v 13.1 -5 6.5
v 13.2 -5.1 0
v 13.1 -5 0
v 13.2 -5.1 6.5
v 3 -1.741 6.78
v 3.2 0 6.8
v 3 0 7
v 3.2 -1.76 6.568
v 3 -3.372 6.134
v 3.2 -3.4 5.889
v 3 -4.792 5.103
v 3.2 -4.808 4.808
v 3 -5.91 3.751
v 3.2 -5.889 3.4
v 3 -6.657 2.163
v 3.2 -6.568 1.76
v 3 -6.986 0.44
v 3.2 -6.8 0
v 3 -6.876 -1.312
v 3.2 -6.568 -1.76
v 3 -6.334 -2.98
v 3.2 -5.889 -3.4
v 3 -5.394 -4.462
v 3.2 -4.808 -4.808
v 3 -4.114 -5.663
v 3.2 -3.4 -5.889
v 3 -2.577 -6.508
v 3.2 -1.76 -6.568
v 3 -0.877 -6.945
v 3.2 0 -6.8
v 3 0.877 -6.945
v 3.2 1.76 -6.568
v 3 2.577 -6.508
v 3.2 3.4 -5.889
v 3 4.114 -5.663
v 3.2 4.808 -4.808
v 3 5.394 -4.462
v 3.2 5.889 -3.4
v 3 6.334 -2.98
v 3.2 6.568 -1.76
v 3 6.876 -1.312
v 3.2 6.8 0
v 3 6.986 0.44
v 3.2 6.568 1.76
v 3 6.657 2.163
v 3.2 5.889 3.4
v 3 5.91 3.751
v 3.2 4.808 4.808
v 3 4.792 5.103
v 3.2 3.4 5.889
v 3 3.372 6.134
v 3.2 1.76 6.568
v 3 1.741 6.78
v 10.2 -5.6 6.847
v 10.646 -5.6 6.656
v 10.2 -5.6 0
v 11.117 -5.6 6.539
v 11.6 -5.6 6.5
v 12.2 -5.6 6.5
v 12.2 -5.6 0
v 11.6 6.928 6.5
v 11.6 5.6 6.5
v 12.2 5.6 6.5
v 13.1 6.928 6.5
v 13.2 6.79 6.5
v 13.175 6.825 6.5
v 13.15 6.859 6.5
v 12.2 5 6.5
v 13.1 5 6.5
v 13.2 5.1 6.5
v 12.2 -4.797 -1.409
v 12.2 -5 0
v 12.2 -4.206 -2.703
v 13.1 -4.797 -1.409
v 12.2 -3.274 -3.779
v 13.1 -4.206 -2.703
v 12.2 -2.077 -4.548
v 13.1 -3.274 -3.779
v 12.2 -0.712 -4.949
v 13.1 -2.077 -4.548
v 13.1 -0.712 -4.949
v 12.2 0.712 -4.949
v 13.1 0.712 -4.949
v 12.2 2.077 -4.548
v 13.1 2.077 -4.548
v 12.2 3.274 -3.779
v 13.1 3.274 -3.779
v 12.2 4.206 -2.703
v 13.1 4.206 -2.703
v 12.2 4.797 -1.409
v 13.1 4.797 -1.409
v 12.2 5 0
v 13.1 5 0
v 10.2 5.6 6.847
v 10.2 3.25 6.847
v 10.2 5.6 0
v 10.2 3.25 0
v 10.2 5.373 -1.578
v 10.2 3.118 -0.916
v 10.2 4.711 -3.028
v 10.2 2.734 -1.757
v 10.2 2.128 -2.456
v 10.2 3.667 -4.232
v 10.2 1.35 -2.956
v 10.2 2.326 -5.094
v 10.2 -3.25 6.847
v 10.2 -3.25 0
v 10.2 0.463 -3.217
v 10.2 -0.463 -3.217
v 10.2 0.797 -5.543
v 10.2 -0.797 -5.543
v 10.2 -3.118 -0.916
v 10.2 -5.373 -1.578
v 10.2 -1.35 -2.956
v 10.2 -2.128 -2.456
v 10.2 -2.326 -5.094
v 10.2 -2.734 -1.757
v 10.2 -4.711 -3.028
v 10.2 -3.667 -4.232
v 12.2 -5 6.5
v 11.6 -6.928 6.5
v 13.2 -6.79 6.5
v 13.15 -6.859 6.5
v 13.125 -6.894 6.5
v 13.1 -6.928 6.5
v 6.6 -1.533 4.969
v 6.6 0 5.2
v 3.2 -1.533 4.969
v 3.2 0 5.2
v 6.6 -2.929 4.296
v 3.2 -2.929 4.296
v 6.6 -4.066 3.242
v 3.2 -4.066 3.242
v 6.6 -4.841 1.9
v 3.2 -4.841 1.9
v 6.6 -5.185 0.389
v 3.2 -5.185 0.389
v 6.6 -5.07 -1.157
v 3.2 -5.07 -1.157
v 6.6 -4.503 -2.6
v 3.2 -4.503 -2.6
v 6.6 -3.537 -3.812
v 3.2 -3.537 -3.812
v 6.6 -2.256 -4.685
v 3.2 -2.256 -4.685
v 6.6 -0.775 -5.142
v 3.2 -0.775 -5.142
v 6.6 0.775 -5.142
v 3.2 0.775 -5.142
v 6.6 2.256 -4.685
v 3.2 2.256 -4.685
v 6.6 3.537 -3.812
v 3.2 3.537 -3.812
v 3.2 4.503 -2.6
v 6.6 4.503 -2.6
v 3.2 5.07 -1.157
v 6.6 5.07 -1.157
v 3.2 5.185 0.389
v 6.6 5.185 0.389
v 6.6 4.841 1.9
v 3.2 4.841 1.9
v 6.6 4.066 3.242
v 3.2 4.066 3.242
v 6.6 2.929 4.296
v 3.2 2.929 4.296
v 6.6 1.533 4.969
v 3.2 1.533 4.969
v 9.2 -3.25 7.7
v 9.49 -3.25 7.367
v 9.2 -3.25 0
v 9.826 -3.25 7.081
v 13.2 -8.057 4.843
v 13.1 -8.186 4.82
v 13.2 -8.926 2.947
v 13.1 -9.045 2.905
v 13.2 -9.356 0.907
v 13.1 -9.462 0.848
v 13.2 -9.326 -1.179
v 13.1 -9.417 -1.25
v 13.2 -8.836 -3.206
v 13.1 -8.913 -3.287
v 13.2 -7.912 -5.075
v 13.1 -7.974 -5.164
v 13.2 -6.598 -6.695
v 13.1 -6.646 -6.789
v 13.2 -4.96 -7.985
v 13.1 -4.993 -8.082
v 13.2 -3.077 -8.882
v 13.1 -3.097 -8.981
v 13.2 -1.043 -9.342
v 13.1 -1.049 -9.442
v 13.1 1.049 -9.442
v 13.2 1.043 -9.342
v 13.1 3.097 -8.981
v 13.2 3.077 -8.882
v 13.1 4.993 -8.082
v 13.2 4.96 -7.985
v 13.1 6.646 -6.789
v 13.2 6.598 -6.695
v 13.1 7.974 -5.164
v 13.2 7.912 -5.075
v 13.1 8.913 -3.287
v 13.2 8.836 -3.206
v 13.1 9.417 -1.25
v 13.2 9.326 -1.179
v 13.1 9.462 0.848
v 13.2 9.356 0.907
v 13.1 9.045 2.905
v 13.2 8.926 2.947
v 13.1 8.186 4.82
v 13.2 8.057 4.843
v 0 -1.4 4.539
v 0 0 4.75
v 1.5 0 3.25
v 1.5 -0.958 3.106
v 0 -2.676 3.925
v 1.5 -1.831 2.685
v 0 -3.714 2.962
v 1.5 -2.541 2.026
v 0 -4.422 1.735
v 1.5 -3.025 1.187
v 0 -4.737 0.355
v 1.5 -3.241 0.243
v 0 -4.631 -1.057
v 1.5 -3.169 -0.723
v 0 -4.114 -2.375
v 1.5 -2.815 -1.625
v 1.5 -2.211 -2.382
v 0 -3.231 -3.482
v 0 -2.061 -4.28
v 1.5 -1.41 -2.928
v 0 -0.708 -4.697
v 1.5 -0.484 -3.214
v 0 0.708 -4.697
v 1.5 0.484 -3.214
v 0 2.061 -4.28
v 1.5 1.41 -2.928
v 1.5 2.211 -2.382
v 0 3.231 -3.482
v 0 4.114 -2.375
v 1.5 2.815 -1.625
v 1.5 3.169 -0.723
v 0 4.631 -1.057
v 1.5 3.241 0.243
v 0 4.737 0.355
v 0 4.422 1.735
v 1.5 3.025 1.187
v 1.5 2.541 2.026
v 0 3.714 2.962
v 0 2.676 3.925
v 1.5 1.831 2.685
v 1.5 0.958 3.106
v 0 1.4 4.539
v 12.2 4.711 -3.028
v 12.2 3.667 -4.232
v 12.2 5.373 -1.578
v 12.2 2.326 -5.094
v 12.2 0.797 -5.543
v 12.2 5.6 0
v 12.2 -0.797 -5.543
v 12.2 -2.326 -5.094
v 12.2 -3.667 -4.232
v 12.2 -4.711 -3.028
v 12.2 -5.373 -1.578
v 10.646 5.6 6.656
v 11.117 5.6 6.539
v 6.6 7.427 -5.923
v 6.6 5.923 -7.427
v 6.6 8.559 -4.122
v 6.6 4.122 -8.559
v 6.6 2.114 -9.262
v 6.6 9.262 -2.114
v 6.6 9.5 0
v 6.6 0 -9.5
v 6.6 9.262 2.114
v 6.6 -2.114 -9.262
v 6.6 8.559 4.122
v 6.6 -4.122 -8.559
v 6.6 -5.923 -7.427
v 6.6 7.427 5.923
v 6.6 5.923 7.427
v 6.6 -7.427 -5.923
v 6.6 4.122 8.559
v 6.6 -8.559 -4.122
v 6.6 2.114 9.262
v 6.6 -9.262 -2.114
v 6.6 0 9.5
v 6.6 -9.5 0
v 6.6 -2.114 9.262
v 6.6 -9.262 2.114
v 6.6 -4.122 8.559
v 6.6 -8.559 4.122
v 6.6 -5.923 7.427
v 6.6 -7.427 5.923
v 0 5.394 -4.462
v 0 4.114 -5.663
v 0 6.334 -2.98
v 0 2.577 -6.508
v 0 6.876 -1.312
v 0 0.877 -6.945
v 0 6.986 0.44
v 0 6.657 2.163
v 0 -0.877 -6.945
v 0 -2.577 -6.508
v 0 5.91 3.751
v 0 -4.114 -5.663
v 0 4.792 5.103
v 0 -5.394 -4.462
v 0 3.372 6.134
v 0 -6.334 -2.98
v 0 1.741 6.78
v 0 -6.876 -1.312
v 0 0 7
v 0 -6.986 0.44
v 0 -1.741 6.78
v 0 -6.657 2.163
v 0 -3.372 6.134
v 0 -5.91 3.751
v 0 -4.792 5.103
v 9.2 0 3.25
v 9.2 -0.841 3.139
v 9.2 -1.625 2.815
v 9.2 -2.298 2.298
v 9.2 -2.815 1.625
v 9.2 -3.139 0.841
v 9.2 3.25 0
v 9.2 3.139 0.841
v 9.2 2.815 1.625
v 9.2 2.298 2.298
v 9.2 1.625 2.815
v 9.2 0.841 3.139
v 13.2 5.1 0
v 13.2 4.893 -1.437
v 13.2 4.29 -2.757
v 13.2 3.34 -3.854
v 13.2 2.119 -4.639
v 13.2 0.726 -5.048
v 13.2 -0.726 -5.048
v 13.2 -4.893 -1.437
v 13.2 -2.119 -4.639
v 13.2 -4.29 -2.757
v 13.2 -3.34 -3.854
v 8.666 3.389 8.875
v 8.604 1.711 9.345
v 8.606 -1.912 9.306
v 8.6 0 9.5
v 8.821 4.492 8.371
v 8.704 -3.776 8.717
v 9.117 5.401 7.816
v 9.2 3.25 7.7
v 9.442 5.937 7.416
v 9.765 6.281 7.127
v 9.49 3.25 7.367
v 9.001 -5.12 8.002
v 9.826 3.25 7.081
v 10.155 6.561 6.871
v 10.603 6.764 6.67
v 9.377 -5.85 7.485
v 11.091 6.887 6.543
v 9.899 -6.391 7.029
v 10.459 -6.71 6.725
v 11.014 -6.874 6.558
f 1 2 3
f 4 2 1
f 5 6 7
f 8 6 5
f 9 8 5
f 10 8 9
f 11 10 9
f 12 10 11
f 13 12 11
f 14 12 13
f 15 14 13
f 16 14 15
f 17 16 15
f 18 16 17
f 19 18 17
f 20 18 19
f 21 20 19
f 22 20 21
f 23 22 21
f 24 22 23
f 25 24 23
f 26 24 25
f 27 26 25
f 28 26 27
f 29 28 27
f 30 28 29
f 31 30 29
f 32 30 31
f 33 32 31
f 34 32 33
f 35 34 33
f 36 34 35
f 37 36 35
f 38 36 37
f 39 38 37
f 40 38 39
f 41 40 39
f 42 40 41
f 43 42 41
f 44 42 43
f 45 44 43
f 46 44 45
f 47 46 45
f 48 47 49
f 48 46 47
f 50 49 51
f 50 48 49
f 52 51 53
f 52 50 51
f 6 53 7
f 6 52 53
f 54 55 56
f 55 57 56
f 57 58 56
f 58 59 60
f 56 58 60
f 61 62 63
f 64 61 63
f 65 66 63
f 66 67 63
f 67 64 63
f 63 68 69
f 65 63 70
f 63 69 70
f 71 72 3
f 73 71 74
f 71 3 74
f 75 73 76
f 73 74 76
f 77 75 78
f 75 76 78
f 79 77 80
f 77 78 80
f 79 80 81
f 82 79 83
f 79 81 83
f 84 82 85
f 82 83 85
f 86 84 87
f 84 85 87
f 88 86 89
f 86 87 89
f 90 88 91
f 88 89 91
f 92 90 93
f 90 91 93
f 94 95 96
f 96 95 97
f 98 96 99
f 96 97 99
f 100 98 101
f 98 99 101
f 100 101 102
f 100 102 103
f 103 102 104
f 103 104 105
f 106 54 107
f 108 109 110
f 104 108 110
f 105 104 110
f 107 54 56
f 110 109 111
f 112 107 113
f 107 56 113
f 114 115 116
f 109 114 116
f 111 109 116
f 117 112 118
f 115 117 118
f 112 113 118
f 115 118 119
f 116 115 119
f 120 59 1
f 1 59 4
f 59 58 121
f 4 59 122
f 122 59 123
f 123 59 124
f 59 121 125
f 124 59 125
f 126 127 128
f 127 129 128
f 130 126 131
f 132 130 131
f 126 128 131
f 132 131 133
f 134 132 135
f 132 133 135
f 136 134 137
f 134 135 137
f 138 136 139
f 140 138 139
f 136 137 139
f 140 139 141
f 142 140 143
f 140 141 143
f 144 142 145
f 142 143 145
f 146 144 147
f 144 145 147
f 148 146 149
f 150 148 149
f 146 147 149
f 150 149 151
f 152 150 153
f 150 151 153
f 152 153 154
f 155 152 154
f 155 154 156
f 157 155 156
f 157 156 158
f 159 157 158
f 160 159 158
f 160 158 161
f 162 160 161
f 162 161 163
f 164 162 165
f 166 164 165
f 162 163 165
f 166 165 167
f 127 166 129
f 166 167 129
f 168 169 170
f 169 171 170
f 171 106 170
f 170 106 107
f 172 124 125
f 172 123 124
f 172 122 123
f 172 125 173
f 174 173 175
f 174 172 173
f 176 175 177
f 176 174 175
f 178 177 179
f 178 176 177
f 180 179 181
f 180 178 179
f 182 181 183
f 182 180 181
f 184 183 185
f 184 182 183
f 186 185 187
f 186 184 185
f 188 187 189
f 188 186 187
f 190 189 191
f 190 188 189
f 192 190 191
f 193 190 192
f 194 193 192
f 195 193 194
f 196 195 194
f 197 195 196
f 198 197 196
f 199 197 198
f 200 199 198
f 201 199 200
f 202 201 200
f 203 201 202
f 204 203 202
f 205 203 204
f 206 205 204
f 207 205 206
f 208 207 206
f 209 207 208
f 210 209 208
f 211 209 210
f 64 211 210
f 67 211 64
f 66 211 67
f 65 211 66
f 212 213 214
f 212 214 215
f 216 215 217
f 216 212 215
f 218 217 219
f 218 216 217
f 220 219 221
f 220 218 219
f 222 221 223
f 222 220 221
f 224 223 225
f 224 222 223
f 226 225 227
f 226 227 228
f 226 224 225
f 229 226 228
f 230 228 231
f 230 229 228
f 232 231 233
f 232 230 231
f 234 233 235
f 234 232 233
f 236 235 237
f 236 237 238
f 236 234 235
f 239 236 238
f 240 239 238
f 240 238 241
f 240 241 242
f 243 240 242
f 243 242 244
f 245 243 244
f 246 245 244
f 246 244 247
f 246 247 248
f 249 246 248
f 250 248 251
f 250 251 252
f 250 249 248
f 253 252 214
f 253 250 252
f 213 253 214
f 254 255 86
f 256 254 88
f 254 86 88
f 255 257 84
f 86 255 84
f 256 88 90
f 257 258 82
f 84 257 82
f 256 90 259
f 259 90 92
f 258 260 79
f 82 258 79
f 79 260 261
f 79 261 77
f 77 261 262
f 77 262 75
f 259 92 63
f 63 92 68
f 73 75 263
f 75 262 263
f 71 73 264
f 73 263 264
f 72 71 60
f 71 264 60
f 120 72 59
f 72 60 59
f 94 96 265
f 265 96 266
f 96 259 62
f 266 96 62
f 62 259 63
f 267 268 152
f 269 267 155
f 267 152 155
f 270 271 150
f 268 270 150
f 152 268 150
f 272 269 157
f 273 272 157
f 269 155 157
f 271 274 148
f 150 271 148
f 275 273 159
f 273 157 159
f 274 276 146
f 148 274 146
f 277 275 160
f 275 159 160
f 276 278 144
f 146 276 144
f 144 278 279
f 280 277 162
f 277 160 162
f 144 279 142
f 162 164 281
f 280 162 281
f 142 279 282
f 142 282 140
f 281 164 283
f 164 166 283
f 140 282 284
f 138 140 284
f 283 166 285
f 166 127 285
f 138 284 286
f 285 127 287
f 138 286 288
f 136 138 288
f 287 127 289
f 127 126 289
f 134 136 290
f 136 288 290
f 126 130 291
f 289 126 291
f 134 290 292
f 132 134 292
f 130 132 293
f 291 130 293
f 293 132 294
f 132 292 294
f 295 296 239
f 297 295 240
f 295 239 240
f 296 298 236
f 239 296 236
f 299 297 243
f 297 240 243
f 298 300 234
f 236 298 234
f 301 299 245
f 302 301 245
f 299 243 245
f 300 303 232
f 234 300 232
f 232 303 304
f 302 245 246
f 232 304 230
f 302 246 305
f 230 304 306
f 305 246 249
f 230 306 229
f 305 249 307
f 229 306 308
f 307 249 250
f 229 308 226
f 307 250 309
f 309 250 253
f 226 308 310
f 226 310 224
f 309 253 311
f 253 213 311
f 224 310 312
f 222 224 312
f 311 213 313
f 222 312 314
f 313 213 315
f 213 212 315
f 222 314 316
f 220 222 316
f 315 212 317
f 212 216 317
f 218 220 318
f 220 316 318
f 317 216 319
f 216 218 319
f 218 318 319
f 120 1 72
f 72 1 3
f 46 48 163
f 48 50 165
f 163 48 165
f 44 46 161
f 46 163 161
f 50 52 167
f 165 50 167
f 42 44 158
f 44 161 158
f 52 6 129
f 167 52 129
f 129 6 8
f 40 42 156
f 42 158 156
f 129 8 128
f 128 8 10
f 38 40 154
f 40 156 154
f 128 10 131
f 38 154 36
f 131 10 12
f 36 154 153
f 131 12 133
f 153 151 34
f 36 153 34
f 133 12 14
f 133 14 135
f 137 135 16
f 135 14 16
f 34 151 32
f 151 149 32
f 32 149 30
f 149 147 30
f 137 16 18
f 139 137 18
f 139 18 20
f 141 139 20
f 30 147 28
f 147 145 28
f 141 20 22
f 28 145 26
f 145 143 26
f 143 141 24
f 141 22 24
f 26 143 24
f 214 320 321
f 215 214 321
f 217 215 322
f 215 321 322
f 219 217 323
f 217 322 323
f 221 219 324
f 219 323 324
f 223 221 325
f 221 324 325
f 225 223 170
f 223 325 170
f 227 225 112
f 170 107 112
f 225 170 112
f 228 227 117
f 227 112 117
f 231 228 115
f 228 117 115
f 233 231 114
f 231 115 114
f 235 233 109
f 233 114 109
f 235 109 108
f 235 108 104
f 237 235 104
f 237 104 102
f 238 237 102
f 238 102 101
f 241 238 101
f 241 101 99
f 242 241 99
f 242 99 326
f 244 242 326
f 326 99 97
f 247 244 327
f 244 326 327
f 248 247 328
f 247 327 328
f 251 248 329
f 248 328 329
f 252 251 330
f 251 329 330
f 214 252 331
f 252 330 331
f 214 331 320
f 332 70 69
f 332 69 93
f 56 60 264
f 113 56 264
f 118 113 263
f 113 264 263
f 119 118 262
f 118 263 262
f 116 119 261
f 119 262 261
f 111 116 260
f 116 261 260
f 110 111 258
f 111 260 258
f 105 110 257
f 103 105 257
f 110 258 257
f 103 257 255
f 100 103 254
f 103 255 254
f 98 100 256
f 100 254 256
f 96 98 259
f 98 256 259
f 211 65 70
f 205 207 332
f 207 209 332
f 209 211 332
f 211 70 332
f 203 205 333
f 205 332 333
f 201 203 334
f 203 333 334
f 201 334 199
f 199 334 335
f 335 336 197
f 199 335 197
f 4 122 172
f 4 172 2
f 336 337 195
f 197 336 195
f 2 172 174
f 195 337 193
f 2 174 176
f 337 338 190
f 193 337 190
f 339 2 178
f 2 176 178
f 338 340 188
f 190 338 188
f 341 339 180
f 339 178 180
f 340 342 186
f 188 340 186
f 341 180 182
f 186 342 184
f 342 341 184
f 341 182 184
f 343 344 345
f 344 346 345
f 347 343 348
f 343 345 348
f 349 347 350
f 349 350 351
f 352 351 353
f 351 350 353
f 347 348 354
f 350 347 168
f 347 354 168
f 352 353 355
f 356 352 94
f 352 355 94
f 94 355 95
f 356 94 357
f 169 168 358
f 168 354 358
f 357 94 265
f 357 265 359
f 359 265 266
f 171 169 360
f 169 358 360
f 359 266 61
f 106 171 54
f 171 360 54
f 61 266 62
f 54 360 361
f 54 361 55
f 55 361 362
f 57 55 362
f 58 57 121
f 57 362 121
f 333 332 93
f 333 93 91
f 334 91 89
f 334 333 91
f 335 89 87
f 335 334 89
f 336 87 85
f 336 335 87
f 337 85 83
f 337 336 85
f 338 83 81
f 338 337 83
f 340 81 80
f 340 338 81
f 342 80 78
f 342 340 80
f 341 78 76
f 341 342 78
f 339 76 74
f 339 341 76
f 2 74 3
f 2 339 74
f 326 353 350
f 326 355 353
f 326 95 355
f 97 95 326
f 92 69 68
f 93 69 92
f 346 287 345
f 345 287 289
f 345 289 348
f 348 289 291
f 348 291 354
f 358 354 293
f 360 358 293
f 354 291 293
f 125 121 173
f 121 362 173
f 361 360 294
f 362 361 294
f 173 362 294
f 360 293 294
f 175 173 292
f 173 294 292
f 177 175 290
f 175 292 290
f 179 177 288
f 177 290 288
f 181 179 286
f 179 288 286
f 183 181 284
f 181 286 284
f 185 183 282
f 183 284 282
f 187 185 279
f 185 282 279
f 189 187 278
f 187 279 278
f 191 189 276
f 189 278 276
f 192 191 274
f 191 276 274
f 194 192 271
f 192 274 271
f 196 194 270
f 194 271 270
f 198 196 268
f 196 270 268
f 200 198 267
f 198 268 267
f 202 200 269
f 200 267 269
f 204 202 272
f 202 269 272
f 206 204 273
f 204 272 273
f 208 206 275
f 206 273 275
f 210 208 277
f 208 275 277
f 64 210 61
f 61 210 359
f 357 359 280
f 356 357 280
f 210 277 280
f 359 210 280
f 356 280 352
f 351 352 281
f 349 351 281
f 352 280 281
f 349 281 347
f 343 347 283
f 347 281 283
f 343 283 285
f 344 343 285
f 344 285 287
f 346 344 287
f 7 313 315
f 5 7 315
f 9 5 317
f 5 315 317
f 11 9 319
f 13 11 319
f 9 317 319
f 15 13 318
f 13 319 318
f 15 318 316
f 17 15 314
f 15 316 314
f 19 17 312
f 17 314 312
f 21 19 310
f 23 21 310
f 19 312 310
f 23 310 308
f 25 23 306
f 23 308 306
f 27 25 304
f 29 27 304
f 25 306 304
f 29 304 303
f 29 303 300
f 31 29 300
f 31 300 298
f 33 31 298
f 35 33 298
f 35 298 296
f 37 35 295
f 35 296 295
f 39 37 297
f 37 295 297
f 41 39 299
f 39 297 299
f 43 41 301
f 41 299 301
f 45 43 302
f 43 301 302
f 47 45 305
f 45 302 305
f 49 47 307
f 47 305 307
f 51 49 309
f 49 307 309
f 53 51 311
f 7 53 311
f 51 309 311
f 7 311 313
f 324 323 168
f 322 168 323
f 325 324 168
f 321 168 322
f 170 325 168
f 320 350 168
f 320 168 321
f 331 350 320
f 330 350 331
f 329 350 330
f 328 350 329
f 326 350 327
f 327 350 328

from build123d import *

# Parameters (mm, degrees)
ESBO_O5_W                  = 9.579663193
ESBO_O5_H                  = 10
CORTE_EXTRUS_O3_DEPTH      = 1.5
CORTE_EXTRUS_O4_START      = 2
CORTE_EXTRUS_O4_DEPTH      = 2
ESBO_O8_W                  = 9.704276698
ESBO_O8_H                  = 6.5
CORTE_EXTRUS_O5_DEPTH      = 1
CHANFRO2_SIZE              = 0.2
CHANFRO3_SIZE              = 0.1
CHANFRO4_SIZE              = 0.1
CHANFRO5_SIZE              = 1.5
CORTE_EXTRUS_O6_DEPTH      = 19.834542734
CORTE_EXTRUS_O6_DEPTH_BACK = 19.834542734


with BuildPart() as part:
    # Esboço1 → Revolução1 (revolve)
    with BuildSketch(Plane.XY, mode=Mode.PRIVATE) as revolu_o1_sk:
        Polygon((0, 3.25), (10.2, 3.25), (10.2, 5.6), (12.2, 5.6), (12.2, 5), (13.2, 5), (13.2, 9.5), (6.6, 9.5), (6.6, 5.2), (3.2, 5.2), (3.2, 7), (0, 7), align=None)
    revolve(revolu_o1_sk.sketch.rotate(Axis((0, 0, 0), (1, 0, 0)), 90), axis=Axis((0, 0, 0), (1, 0, 0)))

    # Esboço5 → Corte-extrusão3 (cut)
    with BuildSketch(Plane(origin=(13.2, 0, 0), x_dir=(0, 0, -1), z_dir=(1, 0, 0))):
        with Locations((-4.789831597, 0)):
            Rectangle(ESBO_O5_W, ESBO_O5_H)
    extrude(amount=-CORTE_EXTRUS_O3_DEPTH, mode=Mode.SUBTRACT)

    # Esboço7 → Corte-extrusão4 (cut)
    with BuildSketch(Plane(origin=(10.2, 0, 0), x_dir=(0, 0, -1), z_dir=(1, 0, 0)).offset(CORTE_EXTRUS_O4_START)):
        with BuildLine():
            Line((-9.610816569, -5.6), (0, -5.6))
            ThreePointArc((0, -5.6), (-5.6, 0), (0, 5.6))
            Line((0, 5.6), (-9.610816569, 5.6))
            Line((-9.610816569, 5.6), (-9.610816569, -5.6))
        make_face()
    extrude(amount=-CORTE_EXTRUS_O4_DEPTH, mode=Mode.SUBTRACT)

    # Esboço8 → Corte-extrusão5 (cut)
    with BuildSketch(Plane(origin=(10.2, 0, 0), x_dir=(0, 0, -1), z_dir=(1, 0, 0))):
        with Locations((-4.852138349, 0)):
            Rectangle(ESBO_O8_W, ESBO_O8_H)
    extrude(amount=-CORTE_EXTRUS_O5_DEPTH, mode=Mode.SUBTRACT)

    # Chanfro2
    chanfro2_edges = [part.edges().sort_by_distance(p)[0] for p in [
        (3.2, 0, -7),
    ]]
    chamfer(chanfro2_edges, length=CHANFRO2_SIZE)

    # Chanfro3
    chanfro3_edges = [part.edges().sort_by_distance(p)[0] for p in [
        (13.2, 0, -9.5),
    ]]
    chamfer(chanfro3_edges, length=CHANFRO3_SIZE)

    # Chanfro4
    chanfro4_edges = [part.edges().sort_by_distance(p)[0] for p in [
        (13.2, 5, 3.979949748),
        (13.2, -5, 3.979949748),
        (13.2, 0, -5),
    ]]
    chamfer(chanfro4_edges, length=CHANFRO4_SIZE)

    # Chanfro5
    chanfro5_edges = [part.edges().sort_by_distance(p)[0] for p in [
        (0, 0, -3.25),
    ]]
    chamfer(chanfro5_edges, length=CHANFRO5_SIZE)

    # Esboço9 → Corte-extrusão6 (cut, two sides: drawn at the far end of the back side and taken through both)
    with BuildSketch(Plane(origin=(0, 0, 0), x_dir=(1, 0, 0), z_dir=(0, 1, 0)).offset(-CORTE_EXTRUS_O6_DEPTH_BACK)):
        with BuildLine():
            Line((11.6, -6.5), (13.2, -6.5))
            Line((13.2, -6.5), (13.2, -12.5))
            Line((13.2, -12.5), (11.6, -12.5))
            ThreePointArc((11.6, -12.5), (8.6, -9.5), (11.6, -6.5))
        make_face()
    extrude(amount=CORTE_EXTRUS_O6_DEPTH + CORTE_EXTRUS_O6_DEPTH_BACK, mode=Mode.SUBTRACT)


solid = part.part
